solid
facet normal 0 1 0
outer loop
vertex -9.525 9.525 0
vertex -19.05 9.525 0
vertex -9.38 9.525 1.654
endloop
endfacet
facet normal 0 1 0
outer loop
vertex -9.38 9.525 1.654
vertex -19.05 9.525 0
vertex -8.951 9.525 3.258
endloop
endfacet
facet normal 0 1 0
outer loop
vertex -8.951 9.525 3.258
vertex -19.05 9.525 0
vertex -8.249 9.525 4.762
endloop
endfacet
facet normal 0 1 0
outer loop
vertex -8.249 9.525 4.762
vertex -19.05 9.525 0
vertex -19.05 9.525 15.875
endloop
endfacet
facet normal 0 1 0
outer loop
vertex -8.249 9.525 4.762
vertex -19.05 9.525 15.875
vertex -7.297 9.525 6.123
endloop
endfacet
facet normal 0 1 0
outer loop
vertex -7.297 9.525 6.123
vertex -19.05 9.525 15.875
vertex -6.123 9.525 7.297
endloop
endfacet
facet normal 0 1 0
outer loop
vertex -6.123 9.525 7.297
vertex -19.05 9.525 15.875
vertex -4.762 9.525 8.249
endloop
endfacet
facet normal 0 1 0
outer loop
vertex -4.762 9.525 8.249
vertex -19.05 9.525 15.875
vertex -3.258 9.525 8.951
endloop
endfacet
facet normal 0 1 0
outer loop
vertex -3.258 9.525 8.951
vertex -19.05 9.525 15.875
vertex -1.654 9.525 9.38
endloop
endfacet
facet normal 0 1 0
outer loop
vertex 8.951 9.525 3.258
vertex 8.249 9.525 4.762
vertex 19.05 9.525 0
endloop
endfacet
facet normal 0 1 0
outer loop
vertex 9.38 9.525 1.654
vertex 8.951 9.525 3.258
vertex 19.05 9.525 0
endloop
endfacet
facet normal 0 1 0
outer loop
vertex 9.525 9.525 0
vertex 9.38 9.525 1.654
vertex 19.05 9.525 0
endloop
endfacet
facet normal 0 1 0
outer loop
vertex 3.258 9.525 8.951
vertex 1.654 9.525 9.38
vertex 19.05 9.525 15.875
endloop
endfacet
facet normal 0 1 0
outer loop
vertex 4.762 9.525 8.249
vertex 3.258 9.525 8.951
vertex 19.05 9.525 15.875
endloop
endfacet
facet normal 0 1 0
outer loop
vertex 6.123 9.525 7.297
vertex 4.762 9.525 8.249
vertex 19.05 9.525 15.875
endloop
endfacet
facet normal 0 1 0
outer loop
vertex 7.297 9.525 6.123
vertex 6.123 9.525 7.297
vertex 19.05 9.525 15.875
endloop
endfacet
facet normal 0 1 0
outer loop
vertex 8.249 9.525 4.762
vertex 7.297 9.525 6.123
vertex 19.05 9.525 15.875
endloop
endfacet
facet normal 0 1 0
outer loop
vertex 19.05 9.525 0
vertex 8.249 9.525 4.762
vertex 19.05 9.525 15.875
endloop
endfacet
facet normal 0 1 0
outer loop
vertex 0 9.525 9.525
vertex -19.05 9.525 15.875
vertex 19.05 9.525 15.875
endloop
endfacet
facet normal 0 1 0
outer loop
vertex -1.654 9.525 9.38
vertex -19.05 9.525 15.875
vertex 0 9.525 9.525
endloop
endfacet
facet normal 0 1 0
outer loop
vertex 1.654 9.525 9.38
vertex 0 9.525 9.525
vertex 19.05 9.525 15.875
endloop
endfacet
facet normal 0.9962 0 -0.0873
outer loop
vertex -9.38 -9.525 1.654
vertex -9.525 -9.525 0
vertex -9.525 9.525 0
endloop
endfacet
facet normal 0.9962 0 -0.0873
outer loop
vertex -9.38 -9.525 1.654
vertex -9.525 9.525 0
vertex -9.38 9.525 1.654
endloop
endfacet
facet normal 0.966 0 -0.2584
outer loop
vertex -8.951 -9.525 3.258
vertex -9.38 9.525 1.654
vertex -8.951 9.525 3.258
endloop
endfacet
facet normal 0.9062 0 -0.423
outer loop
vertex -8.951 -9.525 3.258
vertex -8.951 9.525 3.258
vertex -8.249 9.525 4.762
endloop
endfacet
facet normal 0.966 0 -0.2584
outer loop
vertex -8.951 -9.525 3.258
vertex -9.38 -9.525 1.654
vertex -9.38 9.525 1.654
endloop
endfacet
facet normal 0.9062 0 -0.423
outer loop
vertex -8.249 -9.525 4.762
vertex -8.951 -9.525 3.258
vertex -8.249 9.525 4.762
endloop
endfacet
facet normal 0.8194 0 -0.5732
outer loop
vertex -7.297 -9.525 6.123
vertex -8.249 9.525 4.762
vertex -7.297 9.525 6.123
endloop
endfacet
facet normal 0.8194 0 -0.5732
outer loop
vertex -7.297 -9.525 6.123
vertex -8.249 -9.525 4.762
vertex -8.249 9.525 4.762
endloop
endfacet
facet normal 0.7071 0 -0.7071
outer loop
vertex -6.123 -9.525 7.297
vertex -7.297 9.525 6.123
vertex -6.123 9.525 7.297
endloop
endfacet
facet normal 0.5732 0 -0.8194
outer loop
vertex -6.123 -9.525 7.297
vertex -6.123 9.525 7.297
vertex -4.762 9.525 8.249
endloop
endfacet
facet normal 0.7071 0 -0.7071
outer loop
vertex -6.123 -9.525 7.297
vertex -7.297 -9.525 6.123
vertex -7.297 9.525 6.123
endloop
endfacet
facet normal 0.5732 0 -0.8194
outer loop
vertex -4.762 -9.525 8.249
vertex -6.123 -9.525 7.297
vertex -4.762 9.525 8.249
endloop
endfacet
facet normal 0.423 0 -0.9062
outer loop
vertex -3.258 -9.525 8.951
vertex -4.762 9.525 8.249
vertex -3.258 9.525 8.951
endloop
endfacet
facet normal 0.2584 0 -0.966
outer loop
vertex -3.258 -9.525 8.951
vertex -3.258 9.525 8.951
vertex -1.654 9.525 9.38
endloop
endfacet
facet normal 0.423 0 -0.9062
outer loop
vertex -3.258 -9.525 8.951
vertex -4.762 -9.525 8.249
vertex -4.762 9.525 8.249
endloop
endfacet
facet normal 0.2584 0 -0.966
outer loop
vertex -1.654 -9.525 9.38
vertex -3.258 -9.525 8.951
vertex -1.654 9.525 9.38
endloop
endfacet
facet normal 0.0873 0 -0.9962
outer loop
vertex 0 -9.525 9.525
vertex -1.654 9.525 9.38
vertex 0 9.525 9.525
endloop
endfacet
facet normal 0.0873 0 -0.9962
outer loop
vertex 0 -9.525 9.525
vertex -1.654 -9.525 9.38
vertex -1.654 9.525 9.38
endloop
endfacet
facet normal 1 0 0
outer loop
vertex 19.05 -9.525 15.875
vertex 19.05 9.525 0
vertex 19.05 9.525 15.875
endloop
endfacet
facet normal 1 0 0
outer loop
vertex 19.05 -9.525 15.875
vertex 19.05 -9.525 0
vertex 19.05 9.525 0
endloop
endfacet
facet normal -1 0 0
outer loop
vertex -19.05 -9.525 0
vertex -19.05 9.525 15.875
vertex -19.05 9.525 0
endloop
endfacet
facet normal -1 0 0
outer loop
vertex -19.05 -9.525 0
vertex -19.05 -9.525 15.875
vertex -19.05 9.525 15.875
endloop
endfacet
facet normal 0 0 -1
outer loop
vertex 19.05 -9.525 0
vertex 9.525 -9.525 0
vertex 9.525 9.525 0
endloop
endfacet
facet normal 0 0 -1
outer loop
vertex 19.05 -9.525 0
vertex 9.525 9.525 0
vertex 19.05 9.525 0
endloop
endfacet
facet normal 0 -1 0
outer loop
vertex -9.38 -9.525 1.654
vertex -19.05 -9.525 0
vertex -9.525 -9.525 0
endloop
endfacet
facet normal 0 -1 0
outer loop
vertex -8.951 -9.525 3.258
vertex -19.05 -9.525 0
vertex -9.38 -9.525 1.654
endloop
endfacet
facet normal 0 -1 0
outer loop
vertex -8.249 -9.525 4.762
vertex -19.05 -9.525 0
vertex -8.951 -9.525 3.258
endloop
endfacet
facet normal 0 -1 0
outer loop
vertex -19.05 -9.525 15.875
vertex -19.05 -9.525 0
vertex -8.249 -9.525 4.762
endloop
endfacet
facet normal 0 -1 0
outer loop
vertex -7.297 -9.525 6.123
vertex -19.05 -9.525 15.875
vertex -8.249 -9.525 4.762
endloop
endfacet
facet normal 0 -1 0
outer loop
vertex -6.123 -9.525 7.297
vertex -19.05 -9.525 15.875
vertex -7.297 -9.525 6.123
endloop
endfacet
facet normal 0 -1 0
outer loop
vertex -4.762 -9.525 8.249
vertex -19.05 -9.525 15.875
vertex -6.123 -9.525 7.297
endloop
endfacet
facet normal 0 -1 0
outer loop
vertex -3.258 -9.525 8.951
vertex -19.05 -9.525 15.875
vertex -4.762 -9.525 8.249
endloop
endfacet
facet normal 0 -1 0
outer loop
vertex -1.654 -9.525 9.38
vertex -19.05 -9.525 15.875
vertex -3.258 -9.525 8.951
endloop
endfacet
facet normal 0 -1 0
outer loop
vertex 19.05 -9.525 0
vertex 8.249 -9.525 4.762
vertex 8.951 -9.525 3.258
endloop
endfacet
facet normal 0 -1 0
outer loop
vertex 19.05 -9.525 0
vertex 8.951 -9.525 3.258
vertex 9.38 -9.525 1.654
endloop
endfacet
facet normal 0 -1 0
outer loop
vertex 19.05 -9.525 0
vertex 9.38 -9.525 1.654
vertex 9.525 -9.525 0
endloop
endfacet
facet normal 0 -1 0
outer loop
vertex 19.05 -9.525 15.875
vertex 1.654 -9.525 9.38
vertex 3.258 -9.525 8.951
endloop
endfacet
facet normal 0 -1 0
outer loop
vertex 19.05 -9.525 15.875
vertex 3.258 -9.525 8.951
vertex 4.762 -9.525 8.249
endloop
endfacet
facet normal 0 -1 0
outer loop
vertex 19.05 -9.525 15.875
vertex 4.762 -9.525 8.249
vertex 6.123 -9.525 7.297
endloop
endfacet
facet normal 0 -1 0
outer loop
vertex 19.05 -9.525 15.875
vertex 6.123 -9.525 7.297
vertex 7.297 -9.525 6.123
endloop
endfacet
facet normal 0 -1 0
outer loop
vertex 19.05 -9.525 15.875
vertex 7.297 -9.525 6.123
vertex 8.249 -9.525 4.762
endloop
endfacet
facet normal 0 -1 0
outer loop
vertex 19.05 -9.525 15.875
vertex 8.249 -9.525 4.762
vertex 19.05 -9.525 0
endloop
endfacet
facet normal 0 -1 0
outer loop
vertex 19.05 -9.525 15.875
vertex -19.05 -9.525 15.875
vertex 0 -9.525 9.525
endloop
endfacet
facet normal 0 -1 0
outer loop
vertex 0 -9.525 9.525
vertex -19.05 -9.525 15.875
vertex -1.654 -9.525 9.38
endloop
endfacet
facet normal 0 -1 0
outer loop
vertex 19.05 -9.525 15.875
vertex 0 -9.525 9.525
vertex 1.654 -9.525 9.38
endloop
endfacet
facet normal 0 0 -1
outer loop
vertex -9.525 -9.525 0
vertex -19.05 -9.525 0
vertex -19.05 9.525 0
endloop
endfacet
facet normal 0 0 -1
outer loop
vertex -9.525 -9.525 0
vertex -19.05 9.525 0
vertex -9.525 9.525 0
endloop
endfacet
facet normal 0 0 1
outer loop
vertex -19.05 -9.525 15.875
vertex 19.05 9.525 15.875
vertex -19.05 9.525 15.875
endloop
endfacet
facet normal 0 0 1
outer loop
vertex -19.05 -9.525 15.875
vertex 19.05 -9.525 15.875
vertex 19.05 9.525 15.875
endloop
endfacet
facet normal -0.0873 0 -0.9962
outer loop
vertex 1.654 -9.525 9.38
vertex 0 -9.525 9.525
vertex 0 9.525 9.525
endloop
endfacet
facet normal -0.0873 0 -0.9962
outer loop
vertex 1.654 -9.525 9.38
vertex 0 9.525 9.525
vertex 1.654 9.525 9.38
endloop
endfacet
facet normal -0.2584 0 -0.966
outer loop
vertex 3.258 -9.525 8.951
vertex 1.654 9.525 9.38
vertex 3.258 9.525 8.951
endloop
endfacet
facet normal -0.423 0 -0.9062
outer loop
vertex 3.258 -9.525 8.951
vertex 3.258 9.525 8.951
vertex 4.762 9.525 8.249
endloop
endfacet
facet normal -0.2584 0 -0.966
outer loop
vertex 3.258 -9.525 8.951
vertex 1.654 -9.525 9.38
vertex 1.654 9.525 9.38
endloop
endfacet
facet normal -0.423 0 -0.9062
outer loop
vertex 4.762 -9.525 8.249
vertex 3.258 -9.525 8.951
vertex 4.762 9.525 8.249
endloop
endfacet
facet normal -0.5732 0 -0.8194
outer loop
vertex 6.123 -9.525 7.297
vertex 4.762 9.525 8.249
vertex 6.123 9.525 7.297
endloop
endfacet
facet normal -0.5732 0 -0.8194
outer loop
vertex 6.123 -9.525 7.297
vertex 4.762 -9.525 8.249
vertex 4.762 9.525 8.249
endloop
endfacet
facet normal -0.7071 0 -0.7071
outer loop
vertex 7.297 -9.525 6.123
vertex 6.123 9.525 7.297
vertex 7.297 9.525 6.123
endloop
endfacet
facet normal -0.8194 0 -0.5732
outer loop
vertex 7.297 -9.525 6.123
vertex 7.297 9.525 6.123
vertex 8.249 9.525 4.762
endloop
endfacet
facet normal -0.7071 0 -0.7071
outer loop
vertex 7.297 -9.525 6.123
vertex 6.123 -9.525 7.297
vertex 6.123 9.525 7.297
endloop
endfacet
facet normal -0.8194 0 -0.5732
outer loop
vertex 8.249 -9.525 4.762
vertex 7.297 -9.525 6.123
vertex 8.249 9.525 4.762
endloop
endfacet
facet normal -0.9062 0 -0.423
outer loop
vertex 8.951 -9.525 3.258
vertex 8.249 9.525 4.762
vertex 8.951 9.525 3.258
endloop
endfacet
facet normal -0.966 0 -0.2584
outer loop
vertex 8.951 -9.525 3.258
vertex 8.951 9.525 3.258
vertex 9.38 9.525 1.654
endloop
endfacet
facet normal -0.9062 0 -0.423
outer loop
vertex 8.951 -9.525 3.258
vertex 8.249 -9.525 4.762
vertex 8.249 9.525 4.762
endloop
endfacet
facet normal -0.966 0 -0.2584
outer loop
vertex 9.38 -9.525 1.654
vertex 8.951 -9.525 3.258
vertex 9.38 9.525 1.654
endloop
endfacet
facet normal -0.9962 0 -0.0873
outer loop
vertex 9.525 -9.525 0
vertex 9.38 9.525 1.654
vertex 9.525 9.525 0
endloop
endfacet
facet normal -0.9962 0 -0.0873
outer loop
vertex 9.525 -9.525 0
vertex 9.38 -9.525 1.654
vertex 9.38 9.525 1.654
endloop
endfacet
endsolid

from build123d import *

# Parameters (mm, degrees)
F1_DEPTH = 9.525


with BuildPart() as f1:
    # F0 (on Front) → F1 (new body, symmetric)
    with BuildSketch(Plane.XZ):
        with BuildLine():
            Line((-19.05, 15.875), (-19.05, 0))
            Line((-19.05, 0), (-9.525, 0))
            ThreePointArc((-9.525, 0), (-6.735192, 6.735192), (0, 9.525))
            ThreePointArc((0, 9.525), (6.735192, 6.735192), (9.525, 0))
            Line((9.525, 0), (19.05, 0))
            Line((19.05, 0), (19.05, 15.875))
            Line((19.05, 15.875), (0, 15.875))
            Line((0, 15.875), (-19.05, 15.875))
        make_face()
    extrude(amount=F1_DEPTH, both=True)


solid = f1.part
